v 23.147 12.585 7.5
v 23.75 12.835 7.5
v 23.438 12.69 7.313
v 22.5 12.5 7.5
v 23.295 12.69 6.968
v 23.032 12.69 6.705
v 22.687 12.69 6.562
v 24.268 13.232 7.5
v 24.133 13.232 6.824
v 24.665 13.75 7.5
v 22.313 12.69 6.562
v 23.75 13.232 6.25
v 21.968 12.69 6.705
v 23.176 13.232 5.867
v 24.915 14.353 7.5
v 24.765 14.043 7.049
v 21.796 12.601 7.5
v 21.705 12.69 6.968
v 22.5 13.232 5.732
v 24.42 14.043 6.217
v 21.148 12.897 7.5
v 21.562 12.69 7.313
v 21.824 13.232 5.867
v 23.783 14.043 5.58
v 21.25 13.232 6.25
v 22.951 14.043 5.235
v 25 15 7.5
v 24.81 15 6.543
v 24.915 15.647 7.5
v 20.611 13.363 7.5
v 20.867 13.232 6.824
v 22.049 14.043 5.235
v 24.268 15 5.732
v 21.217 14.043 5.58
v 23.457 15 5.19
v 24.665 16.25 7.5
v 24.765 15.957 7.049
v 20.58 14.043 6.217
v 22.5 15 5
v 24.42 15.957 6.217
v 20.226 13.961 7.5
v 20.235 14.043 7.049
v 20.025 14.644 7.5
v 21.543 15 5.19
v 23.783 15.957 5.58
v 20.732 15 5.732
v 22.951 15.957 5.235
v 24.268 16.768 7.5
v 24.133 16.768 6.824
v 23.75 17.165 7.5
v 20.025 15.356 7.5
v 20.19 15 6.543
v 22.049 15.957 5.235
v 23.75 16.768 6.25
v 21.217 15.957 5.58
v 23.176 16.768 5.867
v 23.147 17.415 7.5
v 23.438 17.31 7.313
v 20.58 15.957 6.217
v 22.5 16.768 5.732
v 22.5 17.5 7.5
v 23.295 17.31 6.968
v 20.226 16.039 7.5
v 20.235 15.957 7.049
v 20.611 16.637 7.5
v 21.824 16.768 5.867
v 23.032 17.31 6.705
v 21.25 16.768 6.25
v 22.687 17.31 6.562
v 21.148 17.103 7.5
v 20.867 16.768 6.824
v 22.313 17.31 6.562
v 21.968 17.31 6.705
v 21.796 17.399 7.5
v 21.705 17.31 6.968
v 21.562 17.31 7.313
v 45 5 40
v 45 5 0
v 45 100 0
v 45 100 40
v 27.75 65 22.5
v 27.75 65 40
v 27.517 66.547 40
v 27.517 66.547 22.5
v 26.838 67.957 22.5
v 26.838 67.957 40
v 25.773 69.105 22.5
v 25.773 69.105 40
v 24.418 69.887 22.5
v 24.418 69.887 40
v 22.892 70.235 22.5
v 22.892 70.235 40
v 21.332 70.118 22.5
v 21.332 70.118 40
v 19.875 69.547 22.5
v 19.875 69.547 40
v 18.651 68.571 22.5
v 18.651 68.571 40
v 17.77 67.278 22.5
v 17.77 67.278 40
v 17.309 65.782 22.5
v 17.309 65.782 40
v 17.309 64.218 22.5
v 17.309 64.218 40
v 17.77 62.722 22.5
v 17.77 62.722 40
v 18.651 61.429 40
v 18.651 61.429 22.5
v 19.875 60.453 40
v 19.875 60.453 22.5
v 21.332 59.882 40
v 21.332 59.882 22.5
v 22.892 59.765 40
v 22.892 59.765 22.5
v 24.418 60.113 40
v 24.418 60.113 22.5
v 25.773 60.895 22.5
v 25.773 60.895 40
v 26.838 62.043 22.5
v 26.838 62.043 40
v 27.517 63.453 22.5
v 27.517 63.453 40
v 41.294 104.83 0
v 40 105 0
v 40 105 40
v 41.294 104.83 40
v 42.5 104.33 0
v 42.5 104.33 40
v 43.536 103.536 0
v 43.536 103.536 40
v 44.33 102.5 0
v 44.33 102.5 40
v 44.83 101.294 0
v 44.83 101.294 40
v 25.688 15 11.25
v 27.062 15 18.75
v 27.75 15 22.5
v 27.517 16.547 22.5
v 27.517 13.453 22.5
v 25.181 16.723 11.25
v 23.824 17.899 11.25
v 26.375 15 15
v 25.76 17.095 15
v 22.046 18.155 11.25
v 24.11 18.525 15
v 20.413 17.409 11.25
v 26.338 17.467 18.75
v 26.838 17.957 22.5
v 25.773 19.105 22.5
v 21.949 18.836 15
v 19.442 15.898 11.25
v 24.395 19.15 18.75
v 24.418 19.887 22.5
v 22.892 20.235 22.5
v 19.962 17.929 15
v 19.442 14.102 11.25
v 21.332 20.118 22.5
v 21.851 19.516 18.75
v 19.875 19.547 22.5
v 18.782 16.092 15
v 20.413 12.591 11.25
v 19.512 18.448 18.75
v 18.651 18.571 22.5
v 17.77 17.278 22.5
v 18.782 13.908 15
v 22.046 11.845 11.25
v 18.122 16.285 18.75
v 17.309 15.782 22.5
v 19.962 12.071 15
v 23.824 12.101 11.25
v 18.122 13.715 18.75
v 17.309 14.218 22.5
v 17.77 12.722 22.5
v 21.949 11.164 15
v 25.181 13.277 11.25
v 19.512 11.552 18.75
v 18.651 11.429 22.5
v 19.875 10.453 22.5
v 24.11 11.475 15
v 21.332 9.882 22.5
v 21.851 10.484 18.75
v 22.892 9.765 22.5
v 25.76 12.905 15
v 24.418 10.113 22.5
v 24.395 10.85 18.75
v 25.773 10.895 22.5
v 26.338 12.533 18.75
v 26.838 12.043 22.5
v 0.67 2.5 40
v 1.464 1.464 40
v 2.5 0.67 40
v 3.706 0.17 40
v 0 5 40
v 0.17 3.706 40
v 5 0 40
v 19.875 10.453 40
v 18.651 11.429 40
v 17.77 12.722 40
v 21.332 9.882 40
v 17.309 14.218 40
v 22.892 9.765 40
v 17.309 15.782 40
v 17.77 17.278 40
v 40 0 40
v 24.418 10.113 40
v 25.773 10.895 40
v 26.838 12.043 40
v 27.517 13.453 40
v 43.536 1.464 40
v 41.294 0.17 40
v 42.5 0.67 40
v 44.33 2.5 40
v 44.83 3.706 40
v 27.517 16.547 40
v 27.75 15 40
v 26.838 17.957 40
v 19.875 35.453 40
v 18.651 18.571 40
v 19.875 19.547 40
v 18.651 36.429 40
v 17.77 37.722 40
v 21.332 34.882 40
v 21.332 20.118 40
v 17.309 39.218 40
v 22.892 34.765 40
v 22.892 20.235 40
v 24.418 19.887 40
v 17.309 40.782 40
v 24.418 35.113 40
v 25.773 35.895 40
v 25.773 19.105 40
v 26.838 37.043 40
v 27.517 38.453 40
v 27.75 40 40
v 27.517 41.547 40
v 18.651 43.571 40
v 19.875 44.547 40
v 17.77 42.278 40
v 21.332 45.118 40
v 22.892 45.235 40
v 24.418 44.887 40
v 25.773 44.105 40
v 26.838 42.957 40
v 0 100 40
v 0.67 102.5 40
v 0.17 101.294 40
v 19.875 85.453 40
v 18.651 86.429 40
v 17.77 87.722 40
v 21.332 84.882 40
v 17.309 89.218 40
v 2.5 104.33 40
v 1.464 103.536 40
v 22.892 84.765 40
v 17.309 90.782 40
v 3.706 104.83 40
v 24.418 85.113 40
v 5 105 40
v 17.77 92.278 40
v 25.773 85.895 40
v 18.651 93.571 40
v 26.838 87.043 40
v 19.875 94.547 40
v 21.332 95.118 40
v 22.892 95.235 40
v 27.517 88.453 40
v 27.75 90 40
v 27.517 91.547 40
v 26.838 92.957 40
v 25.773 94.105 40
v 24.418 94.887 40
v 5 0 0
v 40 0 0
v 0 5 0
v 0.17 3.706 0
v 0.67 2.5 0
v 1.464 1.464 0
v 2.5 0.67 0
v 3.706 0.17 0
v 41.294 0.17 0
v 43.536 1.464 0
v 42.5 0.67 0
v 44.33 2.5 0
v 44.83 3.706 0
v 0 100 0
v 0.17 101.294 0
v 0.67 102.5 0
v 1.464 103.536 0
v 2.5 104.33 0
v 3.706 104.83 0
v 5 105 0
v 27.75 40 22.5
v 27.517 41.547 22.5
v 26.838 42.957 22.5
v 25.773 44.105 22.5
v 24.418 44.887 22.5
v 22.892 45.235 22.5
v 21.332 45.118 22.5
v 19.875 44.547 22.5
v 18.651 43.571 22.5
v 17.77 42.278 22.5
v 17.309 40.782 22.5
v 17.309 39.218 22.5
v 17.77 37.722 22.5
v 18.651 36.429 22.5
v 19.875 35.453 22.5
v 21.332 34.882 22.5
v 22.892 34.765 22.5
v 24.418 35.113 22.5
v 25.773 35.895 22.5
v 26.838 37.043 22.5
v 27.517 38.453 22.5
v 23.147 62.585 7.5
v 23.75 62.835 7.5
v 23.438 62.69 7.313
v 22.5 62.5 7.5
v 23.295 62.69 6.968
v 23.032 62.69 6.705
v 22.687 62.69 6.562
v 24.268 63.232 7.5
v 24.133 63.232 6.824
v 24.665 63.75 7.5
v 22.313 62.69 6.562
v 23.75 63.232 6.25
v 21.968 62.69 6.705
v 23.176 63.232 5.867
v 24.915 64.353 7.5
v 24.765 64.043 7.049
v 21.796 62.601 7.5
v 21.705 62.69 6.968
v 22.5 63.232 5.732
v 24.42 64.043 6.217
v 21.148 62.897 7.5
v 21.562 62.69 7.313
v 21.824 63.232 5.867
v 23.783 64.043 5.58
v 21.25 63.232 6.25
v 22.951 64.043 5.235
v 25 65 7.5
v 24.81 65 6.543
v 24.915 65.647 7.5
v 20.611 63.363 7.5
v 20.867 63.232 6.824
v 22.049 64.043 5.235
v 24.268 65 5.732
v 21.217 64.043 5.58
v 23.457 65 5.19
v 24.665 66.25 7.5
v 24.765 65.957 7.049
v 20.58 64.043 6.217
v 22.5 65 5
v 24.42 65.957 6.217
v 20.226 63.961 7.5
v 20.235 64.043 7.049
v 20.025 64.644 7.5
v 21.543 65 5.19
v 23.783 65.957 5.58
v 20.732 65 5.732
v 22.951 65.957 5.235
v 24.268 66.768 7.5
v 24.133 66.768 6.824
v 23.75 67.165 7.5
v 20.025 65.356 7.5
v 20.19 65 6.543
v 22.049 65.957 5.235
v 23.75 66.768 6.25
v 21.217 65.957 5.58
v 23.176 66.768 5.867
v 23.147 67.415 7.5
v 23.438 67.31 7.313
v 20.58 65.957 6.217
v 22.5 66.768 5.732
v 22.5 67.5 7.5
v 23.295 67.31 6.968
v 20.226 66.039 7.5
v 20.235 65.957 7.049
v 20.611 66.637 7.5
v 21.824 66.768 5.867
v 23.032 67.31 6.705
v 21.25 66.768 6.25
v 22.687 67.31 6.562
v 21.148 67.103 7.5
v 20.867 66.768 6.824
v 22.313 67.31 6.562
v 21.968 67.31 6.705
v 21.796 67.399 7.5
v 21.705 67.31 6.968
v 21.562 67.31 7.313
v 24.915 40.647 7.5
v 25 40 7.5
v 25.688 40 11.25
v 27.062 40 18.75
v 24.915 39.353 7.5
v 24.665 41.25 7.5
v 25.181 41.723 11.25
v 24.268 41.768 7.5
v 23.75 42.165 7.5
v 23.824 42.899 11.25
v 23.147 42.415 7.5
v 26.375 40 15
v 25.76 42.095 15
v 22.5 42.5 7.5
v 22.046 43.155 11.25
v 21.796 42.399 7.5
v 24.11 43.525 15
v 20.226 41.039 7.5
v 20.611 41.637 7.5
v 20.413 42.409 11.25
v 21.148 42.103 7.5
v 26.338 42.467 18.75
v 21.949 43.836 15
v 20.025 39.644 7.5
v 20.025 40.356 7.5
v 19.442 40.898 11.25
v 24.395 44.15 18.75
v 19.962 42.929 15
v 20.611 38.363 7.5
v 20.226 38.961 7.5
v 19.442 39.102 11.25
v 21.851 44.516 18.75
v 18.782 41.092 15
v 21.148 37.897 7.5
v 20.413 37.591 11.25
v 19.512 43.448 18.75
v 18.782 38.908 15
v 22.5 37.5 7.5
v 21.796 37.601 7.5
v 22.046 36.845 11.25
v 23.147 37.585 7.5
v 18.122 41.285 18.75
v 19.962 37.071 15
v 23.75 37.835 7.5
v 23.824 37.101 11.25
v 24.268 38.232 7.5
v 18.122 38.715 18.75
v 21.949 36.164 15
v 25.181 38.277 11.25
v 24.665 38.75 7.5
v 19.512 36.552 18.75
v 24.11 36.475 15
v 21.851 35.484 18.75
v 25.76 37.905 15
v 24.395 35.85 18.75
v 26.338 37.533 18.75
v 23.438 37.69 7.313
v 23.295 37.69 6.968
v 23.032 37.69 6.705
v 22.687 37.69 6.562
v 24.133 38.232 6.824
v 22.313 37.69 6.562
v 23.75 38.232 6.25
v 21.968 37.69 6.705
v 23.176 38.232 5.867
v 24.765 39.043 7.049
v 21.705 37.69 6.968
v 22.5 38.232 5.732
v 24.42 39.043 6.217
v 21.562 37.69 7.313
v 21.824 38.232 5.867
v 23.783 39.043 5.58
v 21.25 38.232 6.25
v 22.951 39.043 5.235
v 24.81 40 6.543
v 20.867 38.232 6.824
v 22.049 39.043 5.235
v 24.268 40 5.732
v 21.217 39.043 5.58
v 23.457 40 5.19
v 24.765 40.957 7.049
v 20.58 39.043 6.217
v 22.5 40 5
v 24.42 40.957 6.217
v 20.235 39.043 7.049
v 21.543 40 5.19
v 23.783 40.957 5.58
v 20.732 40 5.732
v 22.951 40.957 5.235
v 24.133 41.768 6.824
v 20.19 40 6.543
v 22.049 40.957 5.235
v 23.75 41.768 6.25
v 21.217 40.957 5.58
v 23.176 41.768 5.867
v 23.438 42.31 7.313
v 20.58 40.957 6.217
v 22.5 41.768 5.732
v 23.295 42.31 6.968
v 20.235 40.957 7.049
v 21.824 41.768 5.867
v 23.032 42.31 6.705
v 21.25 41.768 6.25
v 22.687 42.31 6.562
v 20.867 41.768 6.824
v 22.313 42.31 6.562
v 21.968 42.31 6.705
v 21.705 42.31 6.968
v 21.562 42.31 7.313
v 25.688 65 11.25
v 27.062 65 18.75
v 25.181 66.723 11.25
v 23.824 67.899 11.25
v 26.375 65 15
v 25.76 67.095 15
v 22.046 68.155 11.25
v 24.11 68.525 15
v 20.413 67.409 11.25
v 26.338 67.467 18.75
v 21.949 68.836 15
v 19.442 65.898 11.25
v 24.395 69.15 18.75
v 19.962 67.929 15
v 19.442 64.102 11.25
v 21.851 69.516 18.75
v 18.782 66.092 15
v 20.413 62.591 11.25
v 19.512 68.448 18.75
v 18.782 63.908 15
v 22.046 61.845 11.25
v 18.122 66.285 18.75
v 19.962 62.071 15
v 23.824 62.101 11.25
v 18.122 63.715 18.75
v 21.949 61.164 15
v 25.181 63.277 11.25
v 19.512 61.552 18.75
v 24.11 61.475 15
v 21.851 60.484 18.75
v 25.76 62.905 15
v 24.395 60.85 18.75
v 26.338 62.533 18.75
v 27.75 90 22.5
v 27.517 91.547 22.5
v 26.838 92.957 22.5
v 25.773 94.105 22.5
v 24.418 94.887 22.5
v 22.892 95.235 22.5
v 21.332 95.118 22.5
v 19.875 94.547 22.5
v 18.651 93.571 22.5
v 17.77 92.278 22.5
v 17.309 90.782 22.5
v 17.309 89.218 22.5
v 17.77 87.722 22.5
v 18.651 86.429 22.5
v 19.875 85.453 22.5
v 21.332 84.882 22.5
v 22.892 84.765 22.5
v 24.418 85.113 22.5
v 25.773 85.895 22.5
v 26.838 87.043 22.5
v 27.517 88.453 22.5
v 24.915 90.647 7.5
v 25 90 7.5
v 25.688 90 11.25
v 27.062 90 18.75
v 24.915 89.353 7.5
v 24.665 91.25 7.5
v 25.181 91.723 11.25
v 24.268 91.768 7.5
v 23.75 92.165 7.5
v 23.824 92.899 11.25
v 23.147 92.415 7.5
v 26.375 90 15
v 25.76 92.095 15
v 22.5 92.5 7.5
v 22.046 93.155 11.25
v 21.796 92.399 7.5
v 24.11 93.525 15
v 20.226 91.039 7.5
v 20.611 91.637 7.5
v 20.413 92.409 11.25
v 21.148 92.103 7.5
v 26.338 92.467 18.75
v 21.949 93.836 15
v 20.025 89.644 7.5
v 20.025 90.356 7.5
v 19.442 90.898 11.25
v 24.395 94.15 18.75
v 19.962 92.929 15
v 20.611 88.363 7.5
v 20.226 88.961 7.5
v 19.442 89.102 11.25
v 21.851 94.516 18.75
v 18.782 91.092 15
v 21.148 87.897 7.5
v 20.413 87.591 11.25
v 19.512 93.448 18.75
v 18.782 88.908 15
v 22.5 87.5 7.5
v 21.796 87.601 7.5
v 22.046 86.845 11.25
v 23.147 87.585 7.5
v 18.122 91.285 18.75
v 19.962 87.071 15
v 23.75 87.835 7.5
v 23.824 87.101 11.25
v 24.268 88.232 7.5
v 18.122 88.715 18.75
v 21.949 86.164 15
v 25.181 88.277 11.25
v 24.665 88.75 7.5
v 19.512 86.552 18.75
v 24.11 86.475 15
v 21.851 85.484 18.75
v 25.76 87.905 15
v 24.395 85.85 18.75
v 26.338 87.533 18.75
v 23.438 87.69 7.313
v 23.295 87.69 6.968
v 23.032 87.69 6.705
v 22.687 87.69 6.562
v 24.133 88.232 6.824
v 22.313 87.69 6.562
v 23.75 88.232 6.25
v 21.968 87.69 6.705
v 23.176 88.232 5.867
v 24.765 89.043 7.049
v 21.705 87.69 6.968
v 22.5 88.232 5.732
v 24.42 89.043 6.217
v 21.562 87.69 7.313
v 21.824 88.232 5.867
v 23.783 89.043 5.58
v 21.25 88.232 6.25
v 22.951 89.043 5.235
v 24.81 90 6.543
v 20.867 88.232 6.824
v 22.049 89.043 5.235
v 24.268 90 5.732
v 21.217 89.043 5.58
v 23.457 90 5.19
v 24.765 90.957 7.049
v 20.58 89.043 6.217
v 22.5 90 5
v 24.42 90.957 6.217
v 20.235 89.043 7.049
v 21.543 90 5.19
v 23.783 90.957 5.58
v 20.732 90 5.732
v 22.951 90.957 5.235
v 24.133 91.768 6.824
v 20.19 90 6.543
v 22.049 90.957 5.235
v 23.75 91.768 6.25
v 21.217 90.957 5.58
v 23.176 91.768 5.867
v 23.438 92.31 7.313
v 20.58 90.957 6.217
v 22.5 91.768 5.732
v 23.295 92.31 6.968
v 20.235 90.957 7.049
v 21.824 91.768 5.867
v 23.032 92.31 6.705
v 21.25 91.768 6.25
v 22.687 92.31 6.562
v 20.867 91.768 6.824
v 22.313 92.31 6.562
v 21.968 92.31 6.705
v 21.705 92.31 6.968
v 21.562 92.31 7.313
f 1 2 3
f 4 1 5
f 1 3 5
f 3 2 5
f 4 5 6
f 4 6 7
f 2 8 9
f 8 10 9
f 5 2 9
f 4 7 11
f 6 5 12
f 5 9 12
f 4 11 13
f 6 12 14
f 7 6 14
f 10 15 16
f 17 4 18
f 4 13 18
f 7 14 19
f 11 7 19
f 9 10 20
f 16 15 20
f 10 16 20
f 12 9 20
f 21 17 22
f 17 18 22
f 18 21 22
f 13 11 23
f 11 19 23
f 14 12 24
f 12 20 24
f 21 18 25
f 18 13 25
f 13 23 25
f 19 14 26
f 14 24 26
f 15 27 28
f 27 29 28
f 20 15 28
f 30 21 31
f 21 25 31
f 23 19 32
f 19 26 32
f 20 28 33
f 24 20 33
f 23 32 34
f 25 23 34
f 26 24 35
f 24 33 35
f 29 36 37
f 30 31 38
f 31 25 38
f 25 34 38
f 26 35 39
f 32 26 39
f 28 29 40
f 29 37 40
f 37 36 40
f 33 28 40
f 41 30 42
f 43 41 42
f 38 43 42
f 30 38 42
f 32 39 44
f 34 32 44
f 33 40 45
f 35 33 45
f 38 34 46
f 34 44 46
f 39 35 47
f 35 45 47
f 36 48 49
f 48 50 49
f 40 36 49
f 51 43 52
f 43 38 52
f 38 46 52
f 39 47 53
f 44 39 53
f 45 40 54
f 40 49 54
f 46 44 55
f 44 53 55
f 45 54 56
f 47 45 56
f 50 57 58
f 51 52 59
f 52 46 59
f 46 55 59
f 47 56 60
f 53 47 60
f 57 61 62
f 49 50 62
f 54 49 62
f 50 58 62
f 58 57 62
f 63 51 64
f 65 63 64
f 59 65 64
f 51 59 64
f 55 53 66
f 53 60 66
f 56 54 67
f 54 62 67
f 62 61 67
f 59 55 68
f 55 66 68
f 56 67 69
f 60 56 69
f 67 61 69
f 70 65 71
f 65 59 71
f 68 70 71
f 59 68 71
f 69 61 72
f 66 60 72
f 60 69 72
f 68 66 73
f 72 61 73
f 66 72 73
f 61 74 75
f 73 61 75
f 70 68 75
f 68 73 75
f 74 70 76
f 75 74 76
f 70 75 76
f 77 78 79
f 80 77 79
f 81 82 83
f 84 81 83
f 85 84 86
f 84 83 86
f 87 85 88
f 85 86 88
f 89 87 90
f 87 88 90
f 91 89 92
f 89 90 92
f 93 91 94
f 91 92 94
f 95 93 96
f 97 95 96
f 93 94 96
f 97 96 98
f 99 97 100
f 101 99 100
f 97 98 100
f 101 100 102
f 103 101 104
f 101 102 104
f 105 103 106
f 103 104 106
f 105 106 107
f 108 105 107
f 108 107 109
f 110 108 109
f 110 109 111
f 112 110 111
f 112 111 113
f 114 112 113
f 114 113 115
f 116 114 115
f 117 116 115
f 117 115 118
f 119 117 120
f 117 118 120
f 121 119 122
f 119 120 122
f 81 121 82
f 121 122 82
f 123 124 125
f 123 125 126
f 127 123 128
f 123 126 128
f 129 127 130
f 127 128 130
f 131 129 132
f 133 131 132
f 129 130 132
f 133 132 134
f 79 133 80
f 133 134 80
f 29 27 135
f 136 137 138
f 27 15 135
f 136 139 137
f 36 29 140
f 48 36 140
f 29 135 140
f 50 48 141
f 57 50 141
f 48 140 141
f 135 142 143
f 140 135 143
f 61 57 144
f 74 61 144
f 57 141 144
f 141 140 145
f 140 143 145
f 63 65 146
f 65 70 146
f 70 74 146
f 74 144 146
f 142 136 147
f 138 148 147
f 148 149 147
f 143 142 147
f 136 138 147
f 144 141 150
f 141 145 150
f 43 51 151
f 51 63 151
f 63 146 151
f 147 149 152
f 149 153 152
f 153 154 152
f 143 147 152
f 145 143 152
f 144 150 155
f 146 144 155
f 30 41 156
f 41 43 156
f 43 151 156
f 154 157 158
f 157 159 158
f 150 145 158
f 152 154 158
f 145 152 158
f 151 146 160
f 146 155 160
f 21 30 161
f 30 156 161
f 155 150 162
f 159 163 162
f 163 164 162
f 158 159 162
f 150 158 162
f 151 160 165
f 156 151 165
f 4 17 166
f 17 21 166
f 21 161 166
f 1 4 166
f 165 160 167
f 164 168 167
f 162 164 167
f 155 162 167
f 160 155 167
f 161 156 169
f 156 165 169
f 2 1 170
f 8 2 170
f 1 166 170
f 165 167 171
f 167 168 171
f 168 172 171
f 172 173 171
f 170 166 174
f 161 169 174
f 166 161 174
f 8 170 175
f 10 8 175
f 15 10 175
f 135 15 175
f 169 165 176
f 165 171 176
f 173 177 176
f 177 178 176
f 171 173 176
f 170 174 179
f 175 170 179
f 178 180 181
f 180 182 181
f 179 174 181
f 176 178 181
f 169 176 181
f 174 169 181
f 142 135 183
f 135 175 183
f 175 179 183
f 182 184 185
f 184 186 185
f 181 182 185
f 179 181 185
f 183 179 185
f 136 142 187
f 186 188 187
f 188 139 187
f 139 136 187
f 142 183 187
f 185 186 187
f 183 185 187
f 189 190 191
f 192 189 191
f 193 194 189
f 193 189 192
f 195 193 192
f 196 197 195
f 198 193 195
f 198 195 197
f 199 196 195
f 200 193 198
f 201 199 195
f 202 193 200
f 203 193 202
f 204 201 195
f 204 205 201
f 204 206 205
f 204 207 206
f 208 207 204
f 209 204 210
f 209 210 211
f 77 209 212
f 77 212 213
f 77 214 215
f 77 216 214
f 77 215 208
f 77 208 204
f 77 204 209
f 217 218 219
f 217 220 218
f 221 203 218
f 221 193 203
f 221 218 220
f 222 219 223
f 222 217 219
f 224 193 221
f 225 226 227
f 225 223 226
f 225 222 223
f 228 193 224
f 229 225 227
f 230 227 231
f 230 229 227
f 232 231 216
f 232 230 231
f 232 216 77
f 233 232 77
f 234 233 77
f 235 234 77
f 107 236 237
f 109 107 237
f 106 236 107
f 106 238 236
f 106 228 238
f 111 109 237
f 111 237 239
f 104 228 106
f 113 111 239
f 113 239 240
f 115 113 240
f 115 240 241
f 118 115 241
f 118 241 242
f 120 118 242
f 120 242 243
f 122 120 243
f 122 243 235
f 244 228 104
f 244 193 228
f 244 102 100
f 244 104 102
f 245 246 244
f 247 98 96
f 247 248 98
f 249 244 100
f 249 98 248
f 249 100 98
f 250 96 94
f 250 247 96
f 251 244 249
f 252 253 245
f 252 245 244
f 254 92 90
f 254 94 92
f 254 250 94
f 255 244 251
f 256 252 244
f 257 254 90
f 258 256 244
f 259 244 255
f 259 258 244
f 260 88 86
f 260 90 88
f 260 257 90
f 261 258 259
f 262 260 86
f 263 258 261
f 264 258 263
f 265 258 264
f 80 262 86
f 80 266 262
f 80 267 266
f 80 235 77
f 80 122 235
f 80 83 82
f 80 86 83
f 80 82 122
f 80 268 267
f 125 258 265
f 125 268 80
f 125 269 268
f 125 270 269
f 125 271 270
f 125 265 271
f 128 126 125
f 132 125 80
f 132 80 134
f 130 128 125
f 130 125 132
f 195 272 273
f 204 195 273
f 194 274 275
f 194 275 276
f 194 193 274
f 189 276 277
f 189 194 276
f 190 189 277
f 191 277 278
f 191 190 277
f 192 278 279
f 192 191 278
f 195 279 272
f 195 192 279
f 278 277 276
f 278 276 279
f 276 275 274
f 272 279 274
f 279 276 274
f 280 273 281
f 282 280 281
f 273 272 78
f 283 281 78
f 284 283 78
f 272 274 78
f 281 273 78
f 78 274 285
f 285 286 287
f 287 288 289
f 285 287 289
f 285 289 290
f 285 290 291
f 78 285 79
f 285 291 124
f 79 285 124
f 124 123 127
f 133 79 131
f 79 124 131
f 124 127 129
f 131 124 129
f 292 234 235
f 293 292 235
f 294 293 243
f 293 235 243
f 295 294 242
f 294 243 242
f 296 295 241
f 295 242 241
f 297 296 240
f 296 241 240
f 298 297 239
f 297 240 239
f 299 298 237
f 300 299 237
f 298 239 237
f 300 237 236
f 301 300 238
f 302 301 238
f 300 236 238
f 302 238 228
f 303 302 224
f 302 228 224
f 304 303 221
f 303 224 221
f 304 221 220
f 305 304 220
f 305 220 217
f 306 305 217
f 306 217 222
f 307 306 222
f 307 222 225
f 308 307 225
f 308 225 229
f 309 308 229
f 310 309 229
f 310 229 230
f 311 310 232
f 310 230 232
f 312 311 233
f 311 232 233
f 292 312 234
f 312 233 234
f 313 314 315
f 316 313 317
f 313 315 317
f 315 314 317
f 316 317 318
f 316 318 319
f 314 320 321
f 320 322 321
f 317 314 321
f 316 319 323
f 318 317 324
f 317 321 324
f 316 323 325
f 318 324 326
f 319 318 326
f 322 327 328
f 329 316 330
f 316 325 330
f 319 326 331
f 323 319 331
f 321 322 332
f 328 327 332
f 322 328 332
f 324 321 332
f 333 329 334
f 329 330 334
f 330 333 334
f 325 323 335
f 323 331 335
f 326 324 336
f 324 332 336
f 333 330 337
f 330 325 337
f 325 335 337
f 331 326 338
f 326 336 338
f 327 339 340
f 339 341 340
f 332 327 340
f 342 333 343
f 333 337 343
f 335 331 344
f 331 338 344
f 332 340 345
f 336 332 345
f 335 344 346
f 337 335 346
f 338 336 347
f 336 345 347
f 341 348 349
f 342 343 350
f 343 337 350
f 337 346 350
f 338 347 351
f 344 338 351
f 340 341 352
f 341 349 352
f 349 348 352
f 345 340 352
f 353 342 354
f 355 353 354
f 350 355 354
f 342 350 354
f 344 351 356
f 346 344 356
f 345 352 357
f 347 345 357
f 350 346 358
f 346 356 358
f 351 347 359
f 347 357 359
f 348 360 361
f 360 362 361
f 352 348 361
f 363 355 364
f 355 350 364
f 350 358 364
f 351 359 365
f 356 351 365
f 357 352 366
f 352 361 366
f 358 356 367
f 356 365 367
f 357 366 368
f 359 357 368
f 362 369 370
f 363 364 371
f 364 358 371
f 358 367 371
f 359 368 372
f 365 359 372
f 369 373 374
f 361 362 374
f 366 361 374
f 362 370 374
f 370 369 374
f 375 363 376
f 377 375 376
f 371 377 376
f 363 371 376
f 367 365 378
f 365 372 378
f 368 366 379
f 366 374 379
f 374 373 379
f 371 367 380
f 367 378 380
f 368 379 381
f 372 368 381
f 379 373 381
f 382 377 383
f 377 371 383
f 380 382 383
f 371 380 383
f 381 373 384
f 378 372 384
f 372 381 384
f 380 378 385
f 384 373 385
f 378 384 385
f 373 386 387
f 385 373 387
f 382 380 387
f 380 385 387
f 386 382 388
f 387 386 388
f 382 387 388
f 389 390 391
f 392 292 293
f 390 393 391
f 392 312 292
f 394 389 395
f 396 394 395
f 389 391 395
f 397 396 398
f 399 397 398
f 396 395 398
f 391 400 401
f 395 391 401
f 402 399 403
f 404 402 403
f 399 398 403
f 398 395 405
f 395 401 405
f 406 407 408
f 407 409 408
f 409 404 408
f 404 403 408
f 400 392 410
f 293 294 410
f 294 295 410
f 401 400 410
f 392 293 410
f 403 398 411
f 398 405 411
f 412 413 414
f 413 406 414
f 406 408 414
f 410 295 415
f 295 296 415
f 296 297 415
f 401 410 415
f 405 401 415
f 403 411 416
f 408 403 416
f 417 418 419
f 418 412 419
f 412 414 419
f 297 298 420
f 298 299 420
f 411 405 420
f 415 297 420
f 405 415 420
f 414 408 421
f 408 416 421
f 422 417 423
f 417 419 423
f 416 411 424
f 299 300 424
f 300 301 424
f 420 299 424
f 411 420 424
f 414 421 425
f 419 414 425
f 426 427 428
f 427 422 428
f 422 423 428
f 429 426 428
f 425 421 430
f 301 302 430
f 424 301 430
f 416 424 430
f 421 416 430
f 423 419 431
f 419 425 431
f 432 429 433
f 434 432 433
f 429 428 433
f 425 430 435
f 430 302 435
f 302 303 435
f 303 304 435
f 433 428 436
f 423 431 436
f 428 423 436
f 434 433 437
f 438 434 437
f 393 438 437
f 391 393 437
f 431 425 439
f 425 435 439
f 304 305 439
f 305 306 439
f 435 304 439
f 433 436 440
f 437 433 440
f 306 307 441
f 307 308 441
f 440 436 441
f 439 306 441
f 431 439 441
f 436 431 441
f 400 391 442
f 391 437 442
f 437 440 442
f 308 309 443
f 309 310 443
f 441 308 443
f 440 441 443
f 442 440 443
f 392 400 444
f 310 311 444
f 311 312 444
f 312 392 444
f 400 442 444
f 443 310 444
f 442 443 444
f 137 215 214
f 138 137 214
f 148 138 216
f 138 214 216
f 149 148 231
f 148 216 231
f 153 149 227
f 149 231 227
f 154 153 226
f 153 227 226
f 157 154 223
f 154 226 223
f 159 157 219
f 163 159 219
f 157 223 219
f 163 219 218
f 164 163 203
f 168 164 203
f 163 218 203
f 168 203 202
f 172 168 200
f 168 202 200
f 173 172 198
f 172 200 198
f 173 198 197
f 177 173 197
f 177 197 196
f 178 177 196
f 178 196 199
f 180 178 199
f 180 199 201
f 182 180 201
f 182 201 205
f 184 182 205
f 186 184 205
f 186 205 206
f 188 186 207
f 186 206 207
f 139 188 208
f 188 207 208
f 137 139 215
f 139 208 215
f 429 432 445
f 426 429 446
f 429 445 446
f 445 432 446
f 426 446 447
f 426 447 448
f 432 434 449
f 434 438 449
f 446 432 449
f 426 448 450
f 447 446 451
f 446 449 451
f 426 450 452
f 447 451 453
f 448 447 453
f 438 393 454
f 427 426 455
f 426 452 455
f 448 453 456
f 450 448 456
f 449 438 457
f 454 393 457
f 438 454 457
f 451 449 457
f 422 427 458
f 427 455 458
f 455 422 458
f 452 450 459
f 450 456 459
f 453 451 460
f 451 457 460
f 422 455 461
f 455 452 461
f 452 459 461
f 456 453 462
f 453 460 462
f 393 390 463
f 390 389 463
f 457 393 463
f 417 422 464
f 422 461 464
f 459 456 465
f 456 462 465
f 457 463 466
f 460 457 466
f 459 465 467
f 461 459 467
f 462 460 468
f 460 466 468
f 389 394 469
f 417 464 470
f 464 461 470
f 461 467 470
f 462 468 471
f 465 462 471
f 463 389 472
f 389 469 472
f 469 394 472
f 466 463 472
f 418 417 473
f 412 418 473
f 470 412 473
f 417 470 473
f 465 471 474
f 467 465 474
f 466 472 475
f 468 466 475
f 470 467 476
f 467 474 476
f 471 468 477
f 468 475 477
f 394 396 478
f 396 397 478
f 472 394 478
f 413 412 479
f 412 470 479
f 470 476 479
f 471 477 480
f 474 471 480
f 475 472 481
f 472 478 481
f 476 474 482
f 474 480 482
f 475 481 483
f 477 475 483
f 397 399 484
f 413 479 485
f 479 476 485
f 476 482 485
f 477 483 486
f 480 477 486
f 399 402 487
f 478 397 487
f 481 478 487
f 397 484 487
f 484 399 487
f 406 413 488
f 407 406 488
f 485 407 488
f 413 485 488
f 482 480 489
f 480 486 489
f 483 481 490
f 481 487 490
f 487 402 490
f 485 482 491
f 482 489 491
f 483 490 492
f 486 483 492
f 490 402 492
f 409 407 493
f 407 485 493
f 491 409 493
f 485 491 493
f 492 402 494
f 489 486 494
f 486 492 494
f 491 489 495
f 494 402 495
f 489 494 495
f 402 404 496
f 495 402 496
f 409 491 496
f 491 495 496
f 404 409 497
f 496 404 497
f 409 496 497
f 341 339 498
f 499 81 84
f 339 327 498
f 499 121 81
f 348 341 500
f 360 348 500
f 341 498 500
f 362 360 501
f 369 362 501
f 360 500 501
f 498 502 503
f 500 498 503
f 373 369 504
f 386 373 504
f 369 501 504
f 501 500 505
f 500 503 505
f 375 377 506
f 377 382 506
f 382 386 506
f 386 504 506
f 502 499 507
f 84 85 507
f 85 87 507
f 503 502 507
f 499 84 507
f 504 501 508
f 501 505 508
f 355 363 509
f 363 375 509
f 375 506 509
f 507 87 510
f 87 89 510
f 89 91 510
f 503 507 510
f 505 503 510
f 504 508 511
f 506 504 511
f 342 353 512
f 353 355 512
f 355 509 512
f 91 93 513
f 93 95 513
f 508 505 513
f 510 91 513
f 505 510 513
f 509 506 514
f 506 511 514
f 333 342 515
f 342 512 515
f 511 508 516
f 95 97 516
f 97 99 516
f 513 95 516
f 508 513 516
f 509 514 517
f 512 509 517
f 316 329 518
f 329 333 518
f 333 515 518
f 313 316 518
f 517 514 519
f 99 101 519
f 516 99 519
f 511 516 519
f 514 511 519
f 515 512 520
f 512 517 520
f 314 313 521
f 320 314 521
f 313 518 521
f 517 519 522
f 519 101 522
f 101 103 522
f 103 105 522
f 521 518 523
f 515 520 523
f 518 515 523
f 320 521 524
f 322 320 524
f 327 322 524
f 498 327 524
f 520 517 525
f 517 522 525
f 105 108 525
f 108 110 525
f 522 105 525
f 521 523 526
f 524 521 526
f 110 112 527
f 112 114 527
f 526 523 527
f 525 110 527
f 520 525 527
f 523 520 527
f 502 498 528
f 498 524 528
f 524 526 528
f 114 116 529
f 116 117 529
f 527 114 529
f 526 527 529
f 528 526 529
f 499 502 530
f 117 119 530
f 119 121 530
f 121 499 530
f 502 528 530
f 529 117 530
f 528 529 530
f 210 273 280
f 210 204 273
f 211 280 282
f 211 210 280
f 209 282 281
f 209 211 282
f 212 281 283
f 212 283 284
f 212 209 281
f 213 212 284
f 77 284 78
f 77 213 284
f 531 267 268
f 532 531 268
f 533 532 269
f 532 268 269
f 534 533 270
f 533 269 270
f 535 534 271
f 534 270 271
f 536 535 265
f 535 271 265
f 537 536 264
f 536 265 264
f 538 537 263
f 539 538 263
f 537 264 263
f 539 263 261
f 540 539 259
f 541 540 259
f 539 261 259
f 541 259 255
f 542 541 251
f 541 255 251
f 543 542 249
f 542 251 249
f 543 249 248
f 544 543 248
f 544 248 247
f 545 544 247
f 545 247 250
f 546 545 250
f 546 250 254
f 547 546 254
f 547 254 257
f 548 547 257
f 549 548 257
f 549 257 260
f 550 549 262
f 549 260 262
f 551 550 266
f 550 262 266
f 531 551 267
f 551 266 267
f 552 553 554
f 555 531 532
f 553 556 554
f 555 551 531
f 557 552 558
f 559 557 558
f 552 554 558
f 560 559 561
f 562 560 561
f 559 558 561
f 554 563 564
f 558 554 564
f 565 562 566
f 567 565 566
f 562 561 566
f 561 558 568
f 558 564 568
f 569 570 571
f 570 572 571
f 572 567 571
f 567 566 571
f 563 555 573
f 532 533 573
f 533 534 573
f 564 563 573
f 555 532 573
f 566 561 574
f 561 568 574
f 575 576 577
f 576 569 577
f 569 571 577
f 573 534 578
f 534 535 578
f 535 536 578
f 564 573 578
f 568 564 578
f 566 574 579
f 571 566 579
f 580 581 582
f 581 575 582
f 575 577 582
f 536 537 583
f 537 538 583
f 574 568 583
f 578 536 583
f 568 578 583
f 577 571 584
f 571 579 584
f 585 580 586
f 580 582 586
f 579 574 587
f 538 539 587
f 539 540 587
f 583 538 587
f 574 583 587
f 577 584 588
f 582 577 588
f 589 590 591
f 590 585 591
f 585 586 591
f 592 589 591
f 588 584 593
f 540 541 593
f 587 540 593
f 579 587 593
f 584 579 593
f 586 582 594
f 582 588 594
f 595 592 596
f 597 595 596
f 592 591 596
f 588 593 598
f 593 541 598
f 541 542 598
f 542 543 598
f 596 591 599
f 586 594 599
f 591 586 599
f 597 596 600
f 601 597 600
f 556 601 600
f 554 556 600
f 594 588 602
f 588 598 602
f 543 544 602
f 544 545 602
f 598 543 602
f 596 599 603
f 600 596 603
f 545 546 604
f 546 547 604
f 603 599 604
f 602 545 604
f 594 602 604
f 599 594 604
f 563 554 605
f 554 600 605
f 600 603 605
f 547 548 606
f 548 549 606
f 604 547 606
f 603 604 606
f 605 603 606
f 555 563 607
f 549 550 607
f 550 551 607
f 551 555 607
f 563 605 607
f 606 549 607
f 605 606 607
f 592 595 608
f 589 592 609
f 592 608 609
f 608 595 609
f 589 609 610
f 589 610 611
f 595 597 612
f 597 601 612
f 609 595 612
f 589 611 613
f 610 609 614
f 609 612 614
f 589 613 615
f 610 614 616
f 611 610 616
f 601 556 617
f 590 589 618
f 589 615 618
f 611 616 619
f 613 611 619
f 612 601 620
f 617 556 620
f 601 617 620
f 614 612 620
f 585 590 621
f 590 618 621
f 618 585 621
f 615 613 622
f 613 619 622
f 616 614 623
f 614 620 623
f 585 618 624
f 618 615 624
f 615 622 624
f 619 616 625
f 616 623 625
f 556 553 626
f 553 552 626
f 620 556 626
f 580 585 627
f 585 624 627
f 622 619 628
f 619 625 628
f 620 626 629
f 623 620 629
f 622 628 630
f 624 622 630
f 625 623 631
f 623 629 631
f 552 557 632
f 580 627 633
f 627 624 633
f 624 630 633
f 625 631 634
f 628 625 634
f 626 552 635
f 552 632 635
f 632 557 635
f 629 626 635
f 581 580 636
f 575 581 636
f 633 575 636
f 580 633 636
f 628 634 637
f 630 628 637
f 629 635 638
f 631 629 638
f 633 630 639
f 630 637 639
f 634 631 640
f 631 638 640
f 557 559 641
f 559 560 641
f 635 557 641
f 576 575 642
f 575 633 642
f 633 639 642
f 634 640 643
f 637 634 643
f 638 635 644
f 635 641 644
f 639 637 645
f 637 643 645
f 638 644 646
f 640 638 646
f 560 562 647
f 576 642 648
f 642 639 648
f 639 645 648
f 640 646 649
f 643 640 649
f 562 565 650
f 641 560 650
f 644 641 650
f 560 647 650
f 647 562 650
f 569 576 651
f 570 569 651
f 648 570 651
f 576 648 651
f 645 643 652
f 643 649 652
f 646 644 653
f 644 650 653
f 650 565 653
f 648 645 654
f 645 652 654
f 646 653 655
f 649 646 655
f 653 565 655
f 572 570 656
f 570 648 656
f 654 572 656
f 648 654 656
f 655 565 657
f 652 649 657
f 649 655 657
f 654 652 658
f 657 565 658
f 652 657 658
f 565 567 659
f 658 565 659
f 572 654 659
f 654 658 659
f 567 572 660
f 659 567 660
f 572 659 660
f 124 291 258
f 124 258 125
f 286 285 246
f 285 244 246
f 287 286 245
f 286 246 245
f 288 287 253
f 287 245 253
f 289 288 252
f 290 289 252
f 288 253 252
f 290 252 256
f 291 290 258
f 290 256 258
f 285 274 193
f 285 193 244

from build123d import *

# Parameters (mm, degrees)
SKETCH1_W           = 45
SKETCH1_H           = 105
BOSS_EXTRUDE1_DEPTH = 40
SKETCH2_R           = 5.25
CUT_EXTRUDE1_DEPTH  = 17.5
SKETCH7_R           = 2.5
SKETCH6_R           = 5.25
LPATTERN1_COUNT     = 4
LPATTERN1_PITCH     = 25
FILLET1_R           = 5


with BuildPart() as part:
    # Sketch1 → Boss-Extrude1 (new body)
    with BuildSketch(Plane.XY):
        with Locations((22.5, 52.5)):
            Rectangle(SKETCH1_W, SKETCH1_H)
    extrude(amount=BOSS_EXTRUDE1_DEPTH)

    # Sketch2 → Cut-Extrude1 (cut)
    with BuildSketch(Plane.XY.offset(40)):
        with Locations((22.5, 90)):
            Circle(SKETCH2_R)
    cut_extrude1 = extrude(amount=-CUT_EXTRUDE1_DEPTH, mode=Mode.SUBTRACT)

    # Sketch7 → Cut-Loft1 section 0
    with BuildSketch(Plane.XY.offset(7.5)):
        with Locations((22.5, 90)):
            Circle(SKETCH7_R)
    # Sketch6 → Cut-Loft1 section 1
    with BuildSketch(Plane.XY.offset(22.5)):
        with Locations((22.5, 90)):
            Circle(SKETCH6_R)
    cut_loft1 = loft(mode=Mode.SUBTRACT)

    # Sketch8 → Cut-Revolve1 (revolve, cut)
    with BuildSketch(Plane.XY.offset(7.5)):
        with BuildLine():
            Line((22.5, 92.5), (22.5, 87.5))
            ThreePointArc((22.5, 87.5), (20, 90), (22.5, 92.5))
        make_face()
    cut_revolve1 = revolve(axis=Axis((22.5, 105, 7.5), (0, 1, 0)), mode=Mode.SUBTRACT)

    # LPattern1: Cut-Extrude1, Cut-Loft1, Cut-Revolve1 ×4
    with Locations(*[(0, -i * LPATTERN1_PITCH, 0) for i in range(1, LPATTERN1_COUNT)]):
        add(cut_extrude1, mode=Mode.SUBTRACT)
        add(cut_loft1, mode=Mode.SUBTRACT)
        add(cut_revolve1, mode=Mode.SUBTRACT)

    # Fillet1
    fillet1_edges = [part.edges().sort_by_distance(p)[0] for p in [
        (0, 105, 20),
        (45, 105, 20),
        (45, 0, 20),
        (0, 0, 20),
    ]]
    fillet(fillet1_edges, radius=FILLET1_R)


solid = part.part
